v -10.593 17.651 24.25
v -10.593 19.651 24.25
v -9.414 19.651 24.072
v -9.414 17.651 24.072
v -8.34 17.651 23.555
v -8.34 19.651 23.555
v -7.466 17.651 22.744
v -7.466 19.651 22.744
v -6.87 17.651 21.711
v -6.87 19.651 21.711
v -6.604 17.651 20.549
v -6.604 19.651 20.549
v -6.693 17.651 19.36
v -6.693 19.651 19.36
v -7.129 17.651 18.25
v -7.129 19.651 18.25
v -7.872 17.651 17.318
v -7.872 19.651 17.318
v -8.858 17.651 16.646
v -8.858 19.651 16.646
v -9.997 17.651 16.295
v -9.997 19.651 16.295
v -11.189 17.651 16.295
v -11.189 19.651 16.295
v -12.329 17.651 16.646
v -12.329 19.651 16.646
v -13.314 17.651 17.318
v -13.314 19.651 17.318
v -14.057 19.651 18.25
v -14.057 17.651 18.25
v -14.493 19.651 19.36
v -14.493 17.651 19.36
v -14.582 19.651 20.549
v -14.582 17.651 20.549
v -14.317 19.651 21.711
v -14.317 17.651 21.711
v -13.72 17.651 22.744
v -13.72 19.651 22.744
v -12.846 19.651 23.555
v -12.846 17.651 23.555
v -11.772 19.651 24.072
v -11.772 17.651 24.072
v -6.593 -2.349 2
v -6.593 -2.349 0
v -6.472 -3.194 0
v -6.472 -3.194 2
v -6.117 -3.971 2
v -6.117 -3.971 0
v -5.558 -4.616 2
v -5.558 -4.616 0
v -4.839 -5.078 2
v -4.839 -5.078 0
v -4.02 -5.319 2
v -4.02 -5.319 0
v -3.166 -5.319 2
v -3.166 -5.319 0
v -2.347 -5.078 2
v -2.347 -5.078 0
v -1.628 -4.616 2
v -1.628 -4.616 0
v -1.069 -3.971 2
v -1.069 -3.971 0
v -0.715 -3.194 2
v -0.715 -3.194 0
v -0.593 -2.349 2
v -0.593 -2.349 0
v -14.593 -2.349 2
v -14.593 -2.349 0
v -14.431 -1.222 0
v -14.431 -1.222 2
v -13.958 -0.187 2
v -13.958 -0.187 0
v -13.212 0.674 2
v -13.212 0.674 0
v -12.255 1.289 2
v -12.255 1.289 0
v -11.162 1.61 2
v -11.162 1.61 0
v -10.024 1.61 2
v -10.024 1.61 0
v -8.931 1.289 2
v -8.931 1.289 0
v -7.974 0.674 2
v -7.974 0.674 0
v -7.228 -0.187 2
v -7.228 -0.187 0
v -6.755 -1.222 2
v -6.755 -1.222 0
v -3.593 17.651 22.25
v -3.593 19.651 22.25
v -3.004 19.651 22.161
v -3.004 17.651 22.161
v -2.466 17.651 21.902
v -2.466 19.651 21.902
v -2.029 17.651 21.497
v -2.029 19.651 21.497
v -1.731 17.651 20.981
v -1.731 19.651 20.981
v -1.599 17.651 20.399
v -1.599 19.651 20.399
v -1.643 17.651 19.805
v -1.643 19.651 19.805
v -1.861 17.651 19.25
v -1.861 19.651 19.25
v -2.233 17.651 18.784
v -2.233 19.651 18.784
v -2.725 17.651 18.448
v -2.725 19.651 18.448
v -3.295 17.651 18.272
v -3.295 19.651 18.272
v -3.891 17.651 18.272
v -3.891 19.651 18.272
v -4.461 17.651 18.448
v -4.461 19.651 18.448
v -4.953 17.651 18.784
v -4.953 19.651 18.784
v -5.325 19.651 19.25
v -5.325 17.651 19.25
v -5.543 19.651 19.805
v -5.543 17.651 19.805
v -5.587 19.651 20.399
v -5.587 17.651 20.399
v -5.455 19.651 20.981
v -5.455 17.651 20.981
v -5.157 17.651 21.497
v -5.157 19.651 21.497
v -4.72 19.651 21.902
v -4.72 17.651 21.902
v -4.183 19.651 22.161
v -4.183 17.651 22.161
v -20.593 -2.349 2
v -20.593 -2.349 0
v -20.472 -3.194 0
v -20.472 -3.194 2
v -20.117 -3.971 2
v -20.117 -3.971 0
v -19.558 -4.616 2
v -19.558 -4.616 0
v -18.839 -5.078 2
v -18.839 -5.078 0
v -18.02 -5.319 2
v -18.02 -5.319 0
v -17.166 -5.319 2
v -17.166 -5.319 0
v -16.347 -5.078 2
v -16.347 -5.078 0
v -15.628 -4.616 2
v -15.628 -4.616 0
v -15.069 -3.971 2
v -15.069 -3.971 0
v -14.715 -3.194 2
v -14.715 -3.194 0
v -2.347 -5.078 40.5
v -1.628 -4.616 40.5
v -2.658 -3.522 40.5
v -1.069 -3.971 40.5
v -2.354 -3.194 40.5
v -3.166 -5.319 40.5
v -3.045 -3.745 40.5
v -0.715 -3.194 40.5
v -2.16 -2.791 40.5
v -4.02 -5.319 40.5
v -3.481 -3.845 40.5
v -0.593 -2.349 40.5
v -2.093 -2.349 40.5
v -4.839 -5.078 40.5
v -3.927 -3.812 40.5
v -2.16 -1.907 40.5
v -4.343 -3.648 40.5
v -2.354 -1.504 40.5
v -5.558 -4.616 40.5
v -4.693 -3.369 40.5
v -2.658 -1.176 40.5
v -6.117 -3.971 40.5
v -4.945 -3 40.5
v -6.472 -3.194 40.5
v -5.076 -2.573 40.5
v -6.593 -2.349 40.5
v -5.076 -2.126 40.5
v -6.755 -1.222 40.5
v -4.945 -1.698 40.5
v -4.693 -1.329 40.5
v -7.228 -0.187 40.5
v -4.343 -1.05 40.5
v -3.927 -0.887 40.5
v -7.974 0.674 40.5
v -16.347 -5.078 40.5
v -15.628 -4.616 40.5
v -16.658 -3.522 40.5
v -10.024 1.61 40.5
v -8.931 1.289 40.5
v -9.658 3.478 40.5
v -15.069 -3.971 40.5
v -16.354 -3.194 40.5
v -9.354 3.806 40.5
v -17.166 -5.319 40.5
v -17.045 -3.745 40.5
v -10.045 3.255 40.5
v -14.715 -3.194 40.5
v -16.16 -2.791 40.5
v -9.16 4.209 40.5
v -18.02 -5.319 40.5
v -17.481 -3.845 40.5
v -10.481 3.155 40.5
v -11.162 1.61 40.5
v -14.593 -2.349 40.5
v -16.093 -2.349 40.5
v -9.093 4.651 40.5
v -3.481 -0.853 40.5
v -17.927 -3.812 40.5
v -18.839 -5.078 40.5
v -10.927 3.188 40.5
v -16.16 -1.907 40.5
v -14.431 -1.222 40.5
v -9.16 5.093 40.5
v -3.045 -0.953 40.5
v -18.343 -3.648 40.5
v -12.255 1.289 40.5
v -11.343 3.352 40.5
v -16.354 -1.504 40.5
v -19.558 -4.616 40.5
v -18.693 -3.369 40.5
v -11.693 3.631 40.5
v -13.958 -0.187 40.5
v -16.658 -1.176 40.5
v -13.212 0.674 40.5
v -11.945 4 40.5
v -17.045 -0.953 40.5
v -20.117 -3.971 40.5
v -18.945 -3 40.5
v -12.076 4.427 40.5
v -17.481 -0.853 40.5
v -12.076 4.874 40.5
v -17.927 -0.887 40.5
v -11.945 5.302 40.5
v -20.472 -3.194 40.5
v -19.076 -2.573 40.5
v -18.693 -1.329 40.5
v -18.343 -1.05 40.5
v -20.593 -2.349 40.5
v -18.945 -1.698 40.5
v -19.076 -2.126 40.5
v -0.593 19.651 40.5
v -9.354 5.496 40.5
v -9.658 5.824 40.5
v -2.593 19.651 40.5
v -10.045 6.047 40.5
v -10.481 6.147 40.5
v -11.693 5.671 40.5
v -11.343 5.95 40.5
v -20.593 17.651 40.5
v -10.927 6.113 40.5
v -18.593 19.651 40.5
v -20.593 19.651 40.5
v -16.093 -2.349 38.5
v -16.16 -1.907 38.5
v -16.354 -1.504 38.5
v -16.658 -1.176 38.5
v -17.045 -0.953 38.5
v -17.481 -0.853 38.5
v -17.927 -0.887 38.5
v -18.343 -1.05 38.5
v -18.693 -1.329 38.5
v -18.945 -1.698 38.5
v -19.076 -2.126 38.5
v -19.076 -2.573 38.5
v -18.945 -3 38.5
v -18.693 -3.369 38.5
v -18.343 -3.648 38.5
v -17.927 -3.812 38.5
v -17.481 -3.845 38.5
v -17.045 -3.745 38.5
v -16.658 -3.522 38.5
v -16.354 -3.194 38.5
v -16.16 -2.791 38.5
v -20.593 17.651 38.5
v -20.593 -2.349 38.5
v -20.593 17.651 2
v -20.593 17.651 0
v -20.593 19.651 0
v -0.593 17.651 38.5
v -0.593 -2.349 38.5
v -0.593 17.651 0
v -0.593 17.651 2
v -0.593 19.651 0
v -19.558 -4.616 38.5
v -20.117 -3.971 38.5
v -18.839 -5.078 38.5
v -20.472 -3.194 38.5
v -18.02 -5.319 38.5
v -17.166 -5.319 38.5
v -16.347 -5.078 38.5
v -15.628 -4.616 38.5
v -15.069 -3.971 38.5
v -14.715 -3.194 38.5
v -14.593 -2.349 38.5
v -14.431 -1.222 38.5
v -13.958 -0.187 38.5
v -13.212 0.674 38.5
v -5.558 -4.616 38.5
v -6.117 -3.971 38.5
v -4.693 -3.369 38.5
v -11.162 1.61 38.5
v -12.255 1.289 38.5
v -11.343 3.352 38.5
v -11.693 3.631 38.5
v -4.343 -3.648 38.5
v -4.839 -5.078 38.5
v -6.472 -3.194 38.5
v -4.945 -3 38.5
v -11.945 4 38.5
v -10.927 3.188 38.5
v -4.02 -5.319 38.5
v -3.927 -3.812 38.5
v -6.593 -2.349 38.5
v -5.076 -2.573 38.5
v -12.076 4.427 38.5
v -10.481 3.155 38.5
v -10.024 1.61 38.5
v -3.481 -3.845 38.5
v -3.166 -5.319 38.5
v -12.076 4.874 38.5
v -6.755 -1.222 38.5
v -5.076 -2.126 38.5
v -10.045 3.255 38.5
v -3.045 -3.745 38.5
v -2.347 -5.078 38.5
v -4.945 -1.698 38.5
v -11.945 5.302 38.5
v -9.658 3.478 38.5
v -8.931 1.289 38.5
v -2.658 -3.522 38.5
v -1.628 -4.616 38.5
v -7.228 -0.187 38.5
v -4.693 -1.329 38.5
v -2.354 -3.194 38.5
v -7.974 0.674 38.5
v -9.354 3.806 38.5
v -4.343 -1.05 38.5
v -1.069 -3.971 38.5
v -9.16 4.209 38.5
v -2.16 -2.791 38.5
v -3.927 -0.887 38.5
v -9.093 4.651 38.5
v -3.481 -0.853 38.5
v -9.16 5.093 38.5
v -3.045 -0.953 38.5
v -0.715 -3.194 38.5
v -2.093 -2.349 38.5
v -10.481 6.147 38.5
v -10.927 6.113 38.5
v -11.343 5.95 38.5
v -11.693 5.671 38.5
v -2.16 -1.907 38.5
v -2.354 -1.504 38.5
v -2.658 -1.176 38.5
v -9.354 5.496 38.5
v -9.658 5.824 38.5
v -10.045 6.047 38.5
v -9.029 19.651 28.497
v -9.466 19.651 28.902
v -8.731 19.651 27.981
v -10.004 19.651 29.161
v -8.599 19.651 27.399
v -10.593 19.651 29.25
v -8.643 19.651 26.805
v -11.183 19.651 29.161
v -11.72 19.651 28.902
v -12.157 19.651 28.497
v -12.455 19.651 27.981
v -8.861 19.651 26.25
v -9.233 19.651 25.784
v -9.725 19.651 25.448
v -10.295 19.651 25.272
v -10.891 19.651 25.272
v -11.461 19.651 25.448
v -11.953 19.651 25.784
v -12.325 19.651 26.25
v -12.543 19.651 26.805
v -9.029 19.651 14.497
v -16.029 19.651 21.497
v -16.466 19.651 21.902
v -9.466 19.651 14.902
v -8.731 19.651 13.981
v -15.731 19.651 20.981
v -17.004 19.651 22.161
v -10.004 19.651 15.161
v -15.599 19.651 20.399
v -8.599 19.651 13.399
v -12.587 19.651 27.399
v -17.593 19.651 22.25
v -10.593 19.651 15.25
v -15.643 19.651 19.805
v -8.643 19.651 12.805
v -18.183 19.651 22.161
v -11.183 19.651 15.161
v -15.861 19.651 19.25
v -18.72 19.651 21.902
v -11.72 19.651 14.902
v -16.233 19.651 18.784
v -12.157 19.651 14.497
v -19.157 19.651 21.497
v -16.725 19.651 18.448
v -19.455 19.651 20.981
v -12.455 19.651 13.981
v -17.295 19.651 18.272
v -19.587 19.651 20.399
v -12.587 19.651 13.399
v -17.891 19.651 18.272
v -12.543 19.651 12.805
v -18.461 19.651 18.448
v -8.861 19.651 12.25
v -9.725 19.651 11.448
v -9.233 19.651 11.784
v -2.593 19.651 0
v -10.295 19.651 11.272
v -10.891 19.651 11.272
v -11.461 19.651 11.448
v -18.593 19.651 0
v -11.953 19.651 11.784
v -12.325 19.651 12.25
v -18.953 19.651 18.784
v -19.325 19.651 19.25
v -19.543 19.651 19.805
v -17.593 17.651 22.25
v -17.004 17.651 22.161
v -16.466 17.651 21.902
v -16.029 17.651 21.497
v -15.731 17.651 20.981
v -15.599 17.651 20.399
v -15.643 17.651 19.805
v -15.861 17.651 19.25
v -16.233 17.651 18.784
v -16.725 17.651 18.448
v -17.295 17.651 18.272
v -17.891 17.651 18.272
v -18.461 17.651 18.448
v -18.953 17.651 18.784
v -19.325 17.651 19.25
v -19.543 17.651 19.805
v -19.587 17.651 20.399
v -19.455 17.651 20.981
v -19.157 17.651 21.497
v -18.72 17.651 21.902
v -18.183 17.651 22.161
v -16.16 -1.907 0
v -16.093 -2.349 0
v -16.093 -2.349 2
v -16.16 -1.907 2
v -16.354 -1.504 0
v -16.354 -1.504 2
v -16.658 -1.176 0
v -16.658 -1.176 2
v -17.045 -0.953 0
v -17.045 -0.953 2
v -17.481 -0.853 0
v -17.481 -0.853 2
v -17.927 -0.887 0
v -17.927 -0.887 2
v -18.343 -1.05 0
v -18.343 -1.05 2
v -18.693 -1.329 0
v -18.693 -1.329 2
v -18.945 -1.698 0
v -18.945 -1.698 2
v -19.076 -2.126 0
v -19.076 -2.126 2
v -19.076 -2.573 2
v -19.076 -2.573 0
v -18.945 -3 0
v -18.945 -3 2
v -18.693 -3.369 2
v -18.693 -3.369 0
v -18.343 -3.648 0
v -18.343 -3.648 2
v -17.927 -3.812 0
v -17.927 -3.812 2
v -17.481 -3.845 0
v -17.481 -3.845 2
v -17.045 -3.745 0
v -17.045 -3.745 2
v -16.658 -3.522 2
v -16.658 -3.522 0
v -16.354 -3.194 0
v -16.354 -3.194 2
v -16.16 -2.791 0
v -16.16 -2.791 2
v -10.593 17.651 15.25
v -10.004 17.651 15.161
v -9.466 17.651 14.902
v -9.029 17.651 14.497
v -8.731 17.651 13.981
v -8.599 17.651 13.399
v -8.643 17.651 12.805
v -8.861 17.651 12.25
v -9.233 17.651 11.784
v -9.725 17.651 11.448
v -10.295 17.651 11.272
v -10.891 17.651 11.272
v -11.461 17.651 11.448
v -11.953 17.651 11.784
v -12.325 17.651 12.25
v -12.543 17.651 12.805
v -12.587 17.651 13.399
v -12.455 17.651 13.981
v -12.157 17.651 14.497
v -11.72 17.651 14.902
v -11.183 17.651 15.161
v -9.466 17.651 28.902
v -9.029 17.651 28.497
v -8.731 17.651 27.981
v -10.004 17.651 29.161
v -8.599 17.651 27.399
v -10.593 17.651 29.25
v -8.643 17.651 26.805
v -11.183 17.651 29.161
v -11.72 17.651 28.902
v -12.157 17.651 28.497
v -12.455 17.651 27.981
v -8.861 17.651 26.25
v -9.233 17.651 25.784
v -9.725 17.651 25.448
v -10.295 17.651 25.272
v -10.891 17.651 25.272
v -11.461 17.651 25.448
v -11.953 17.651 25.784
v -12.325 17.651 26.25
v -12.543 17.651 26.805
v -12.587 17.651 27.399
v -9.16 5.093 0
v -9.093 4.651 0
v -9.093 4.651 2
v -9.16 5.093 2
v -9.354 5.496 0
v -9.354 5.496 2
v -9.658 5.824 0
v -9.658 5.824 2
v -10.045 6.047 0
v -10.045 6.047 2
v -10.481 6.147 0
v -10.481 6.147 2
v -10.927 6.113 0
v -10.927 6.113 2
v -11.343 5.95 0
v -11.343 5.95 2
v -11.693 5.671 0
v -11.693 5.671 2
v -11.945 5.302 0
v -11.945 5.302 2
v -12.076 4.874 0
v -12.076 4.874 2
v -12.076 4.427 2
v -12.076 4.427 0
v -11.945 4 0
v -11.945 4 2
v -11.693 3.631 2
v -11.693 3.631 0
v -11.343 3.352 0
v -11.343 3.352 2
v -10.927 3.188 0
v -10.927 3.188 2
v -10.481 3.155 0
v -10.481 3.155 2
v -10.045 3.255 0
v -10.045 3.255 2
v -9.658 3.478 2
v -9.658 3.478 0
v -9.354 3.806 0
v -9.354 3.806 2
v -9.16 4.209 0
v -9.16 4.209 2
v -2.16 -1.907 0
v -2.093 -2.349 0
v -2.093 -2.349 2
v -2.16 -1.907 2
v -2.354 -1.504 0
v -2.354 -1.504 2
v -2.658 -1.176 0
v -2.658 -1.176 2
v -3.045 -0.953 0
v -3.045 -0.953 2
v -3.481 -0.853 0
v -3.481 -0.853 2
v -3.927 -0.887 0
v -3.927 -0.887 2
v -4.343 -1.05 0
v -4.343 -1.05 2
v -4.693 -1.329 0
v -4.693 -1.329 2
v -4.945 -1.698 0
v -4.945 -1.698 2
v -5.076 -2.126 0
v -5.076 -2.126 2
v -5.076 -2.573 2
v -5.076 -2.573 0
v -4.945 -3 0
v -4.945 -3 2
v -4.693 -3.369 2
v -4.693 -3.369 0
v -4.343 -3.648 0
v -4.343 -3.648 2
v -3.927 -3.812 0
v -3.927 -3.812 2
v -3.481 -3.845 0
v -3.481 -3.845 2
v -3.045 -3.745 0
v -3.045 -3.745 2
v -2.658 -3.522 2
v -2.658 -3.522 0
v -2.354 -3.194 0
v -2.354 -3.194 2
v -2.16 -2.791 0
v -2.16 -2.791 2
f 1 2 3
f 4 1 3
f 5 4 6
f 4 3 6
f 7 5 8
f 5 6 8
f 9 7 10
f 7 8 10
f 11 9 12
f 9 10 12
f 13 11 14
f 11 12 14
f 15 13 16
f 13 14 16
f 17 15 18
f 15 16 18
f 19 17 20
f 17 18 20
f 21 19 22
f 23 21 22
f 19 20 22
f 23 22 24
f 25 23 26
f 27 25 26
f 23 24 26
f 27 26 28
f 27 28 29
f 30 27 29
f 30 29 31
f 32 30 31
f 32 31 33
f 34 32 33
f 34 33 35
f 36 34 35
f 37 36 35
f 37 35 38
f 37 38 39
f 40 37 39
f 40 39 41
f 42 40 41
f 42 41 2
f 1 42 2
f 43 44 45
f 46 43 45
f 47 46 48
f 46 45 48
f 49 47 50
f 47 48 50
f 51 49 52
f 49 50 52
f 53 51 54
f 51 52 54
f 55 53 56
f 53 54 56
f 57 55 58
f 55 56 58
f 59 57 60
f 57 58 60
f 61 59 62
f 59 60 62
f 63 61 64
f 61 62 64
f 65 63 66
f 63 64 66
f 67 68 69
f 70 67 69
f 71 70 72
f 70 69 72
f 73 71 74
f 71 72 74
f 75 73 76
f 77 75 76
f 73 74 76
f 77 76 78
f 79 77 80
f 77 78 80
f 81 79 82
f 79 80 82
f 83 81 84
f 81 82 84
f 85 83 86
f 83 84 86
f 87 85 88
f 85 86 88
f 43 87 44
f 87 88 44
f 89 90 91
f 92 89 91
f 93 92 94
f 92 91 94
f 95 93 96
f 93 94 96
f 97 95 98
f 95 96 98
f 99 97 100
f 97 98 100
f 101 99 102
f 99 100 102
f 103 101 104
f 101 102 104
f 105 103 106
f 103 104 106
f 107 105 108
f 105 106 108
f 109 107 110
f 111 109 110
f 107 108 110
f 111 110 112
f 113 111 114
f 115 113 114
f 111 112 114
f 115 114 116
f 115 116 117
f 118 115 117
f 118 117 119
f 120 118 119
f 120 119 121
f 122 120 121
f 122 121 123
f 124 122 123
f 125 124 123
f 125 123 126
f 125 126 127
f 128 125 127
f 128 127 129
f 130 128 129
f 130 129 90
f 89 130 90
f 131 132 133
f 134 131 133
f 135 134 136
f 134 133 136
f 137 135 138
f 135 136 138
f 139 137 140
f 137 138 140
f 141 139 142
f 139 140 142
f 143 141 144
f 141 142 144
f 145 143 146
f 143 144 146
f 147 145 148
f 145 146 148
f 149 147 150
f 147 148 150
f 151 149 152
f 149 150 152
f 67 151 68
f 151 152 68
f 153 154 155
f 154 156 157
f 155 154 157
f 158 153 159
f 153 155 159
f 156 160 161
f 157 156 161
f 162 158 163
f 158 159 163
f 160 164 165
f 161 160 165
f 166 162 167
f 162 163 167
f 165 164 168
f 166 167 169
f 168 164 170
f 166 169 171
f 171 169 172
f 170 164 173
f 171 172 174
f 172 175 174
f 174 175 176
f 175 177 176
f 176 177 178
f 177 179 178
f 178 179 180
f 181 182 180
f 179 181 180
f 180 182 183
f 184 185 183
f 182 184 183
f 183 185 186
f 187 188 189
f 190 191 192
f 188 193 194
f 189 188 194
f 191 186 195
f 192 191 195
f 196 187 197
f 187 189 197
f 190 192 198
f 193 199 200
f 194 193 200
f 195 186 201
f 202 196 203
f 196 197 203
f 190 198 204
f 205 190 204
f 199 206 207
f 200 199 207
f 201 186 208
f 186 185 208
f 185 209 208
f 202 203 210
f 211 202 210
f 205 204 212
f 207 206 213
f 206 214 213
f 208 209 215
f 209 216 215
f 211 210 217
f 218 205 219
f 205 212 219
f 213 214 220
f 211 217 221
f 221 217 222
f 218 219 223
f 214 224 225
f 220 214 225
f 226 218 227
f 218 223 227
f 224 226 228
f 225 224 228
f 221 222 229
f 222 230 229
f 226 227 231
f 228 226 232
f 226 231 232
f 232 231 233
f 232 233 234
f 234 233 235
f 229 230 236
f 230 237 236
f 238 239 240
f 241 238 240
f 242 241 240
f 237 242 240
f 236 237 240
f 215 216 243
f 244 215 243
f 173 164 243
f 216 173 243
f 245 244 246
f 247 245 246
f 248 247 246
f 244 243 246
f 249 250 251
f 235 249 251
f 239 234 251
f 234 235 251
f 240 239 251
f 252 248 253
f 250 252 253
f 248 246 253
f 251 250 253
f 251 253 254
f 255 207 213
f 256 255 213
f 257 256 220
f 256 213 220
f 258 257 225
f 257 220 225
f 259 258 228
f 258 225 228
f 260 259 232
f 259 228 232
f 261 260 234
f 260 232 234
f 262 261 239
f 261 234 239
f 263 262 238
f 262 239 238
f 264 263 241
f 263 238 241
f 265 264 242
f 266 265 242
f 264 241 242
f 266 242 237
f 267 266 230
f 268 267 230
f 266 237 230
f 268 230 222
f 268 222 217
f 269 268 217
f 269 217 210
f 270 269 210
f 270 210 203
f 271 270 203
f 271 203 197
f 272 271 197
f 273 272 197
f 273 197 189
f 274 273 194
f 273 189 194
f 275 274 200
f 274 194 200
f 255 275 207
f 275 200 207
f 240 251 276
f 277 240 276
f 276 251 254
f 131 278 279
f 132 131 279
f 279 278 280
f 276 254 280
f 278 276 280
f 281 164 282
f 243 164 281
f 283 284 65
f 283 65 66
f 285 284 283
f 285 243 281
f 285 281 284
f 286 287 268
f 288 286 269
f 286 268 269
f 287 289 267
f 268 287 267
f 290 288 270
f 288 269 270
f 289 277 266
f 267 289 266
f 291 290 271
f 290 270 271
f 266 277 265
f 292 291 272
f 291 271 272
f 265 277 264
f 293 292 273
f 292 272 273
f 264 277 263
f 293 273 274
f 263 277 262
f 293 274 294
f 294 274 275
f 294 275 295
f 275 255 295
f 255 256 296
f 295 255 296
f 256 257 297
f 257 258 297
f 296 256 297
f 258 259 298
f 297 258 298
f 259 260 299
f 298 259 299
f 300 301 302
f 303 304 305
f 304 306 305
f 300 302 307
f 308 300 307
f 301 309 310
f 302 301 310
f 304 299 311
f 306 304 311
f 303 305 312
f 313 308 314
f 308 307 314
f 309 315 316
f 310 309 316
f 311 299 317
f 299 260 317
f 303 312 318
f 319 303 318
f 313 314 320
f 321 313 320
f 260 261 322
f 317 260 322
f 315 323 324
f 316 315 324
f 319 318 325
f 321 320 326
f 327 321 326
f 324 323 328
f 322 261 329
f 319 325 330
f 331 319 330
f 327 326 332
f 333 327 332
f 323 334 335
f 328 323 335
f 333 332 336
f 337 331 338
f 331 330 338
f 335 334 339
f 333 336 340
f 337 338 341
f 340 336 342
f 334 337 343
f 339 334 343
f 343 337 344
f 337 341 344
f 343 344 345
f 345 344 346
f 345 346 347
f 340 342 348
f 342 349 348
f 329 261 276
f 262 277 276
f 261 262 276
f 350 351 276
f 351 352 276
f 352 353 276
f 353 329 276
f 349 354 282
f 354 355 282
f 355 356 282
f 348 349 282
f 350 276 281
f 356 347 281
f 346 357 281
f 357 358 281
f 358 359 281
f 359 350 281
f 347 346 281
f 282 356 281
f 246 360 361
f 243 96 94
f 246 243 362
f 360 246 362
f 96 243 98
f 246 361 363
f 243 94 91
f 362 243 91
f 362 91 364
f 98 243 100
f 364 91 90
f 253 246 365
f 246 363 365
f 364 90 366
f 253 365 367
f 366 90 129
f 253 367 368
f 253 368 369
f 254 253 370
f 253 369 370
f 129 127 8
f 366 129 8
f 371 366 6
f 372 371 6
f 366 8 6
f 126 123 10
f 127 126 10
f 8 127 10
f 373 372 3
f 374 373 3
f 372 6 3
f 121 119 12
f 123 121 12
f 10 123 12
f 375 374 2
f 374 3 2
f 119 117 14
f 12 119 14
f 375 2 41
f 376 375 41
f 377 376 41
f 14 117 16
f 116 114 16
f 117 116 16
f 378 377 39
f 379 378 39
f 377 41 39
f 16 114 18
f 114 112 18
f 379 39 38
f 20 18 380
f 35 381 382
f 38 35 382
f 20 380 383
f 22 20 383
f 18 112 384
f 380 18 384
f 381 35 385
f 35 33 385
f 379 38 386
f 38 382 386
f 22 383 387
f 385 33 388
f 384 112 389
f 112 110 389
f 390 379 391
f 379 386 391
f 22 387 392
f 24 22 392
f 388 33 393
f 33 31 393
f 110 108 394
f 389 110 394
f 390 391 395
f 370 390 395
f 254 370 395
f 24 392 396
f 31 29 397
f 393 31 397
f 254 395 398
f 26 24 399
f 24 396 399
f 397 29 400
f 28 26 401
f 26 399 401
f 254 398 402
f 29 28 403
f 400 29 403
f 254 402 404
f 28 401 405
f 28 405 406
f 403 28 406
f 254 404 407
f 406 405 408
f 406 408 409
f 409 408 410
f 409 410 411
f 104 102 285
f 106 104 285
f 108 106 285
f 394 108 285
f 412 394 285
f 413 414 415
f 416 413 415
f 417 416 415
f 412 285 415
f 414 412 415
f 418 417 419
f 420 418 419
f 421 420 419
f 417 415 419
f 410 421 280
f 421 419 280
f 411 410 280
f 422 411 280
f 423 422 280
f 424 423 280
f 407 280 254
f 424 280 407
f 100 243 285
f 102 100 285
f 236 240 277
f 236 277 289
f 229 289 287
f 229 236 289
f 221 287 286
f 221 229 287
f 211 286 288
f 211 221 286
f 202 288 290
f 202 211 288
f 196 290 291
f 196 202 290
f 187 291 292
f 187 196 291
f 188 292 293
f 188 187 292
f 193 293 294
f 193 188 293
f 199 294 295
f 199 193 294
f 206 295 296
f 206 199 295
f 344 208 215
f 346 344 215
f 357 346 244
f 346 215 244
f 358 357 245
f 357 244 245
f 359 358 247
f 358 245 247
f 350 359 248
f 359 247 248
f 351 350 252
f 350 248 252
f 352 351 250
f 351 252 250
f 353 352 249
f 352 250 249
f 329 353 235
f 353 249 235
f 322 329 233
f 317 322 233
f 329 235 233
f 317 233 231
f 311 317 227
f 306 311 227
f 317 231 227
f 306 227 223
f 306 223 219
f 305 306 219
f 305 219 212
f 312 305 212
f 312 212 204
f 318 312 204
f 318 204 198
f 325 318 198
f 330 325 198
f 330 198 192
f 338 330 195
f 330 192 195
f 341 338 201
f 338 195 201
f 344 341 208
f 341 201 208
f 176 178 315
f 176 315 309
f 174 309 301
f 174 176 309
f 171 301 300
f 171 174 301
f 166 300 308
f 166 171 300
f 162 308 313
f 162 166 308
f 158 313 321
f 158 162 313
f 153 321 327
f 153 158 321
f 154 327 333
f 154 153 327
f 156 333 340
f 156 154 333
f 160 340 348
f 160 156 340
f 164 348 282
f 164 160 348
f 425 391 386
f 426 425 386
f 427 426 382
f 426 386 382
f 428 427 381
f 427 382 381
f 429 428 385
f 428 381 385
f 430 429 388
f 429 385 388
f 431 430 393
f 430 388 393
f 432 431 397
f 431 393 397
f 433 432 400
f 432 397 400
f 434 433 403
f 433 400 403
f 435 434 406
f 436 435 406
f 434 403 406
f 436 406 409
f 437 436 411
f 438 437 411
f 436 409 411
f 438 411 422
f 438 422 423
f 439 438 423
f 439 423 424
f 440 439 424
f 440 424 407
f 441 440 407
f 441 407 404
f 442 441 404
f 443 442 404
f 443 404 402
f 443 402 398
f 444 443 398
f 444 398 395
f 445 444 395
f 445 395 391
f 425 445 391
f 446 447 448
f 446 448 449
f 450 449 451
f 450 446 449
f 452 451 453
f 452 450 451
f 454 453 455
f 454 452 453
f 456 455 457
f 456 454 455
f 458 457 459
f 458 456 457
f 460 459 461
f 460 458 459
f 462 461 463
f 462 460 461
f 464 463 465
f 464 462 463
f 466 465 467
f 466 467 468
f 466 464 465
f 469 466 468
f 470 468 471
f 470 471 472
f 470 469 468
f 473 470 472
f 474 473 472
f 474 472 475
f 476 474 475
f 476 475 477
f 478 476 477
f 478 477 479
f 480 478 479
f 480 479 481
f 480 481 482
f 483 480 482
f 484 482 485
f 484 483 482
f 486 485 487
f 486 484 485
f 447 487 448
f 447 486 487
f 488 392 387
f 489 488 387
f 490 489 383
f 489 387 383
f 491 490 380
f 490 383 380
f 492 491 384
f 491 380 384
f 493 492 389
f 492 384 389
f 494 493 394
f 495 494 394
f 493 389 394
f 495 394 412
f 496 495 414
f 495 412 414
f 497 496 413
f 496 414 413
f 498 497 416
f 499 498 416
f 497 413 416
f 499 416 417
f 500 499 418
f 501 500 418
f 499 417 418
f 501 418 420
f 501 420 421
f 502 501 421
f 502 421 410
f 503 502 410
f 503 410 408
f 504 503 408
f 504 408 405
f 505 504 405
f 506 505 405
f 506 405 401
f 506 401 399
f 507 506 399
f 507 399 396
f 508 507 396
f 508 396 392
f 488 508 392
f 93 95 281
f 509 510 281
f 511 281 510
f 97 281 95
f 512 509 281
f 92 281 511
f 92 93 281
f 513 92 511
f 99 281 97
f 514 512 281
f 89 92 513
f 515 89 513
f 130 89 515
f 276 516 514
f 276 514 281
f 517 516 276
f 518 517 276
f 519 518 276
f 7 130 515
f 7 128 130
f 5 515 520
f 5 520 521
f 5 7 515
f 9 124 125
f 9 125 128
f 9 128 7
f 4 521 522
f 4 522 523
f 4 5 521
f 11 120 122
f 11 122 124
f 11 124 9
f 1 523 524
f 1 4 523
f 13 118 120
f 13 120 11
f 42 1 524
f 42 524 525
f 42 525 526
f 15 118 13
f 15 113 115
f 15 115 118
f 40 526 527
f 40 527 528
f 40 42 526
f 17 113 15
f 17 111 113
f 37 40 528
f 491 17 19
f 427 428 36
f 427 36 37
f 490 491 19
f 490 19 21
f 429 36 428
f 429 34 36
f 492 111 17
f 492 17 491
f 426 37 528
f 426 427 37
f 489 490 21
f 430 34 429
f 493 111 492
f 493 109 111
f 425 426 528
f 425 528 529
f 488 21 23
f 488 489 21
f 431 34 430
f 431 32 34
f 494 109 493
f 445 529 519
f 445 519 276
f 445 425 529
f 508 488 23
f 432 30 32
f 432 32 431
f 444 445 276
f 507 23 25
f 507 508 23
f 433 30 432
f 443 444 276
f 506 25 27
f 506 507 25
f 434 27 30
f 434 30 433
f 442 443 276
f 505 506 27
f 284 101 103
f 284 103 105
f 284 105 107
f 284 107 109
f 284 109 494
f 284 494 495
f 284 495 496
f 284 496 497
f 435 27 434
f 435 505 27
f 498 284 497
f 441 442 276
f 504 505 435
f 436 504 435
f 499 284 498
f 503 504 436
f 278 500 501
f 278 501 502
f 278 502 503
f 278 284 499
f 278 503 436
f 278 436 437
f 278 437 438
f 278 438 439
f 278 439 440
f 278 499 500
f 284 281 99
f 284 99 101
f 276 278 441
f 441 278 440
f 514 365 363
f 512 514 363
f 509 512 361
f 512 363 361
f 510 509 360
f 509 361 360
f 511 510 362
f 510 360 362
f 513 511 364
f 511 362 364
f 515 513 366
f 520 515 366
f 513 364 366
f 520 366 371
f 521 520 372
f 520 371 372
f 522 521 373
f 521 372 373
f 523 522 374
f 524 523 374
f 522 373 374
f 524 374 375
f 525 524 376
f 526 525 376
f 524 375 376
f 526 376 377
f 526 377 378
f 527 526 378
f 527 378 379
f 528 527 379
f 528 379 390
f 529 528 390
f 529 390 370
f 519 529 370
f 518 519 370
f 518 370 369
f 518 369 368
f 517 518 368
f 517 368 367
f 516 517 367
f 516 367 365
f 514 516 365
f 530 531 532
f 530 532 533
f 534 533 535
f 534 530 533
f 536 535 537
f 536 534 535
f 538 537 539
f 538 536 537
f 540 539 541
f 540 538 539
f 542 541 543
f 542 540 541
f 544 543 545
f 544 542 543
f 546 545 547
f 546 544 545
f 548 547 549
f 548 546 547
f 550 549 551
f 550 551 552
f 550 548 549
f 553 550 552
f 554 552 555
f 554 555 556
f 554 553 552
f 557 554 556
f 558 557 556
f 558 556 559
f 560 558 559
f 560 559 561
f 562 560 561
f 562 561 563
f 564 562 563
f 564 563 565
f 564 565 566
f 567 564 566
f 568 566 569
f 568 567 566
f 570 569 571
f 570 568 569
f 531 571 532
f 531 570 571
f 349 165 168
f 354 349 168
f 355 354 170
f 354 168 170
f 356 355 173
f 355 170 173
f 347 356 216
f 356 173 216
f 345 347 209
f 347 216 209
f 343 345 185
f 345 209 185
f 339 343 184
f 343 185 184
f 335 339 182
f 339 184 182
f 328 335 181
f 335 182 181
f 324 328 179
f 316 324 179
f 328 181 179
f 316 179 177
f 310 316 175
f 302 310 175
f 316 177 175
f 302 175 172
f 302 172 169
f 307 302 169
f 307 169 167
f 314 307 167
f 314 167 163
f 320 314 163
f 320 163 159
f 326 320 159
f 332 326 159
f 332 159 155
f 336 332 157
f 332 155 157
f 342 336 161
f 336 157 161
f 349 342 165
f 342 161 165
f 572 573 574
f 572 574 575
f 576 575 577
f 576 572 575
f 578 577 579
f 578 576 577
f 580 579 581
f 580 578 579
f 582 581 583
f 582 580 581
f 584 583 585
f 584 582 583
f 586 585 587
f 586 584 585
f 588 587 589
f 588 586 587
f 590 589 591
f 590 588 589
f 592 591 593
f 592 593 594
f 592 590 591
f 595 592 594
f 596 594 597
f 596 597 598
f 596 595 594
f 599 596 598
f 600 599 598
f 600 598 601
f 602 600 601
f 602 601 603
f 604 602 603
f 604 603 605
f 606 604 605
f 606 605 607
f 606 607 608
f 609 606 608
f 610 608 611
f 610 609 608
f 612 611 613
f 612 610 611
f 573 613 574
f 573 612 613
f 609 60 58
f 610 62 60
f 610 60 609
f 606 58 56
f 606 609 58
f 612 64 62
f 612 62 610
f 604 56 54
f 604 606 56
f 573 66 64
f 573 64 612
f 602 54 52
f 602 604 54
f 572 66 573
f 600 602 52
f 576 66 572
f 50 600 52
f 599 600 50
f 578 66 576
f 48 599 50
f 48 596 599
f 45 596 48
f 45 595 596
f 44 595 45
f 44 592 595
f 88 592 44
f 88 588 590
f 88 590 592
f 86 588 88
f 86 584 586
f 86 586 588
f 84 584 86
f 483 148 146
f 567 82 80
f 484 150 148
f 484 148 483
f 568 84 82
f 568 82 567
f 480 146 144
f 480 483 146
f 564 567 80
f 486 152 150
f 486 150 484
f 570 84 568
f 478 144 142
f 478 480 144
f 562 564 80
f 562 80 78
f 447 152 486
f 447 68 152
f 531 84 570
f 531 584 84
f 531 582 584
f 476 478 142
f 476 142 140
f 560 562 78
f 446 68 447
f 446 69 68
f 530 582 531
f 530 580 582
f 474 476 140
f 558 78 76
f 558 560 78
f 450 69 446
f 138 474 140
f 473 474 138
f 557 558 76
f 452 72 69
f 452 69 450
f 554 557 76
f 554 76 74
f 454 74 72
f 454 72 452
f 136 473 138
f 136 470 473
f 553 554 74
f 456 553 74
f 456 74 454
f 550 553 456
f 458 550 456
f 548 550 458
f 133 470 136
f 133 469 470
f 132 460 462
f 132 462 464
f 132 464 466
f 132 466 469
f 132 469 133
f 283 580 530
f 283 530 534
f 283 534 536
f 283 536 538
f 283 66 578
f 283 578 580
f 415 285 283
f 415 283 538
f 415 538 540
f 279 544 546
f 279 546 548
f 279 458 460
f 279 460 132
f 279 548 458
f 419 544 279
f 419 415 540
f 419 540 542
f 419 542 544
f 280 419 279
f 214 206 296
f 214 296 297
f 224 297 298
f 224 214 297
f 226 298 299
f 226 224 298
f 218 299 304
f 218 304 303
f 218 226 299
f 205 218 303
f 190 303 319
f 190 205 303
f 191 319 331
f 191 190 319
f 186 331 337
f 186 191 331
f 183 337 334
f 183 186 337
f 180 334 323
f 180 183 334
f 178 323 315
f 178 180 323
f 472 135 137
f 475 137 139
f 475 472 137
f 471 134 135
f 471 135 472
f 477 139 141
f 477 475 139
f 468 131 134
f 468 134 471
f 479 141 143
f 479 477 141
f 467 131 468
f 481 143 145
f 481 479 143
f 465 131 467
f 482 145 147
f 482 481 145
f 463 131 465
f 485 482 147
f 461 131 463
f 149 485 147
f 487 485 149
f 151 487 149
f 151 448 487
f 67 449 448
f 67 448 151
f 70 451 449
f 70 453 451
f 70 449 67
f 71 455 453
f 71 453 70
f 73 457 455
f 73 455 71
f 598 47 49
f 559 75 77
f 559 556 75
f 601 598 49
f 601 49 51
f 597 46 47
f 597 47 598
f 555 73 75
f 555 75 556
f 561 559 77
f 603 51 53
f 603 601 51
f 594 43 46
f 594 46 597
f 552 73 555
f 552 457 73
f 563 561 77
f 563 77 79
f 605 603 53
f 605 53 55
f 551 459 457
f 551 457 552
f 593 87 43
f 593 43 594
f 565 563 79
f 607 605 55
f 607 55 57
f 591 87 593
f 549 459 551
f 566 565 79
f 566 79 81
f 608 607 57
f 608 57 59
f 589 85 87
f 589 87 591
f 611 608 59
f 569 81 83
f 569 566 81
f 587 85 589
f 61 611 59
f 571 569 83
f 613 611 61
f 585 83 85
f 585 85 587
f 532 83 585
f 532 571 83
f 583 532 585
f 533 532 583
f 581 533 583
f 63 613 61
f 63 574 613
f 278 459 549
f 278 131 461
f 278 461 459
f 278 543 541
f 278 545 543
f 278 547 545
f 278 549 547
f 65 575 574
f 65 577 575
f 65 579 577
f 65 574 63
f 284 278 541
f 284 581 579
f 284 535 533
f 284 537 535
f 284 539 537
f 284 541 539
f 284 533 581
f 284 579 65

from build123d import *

# Parameters (mm, degrees)
CROQUIS1_R              = 1.5
SALIENTE_EXTRUIR3_DEPTH = 2
CROQUIS7_W              = 20
CROQUIS7_H              = 20.25
SALIENTE_EXTRUIR4_DEPTH = 2
CROQUIS15_R             = 2
CROQUIS15_R_2           = 4
CORTAR_EXTRUIR1_DEPTH   = 10


with BuildPart() as part:
    # Croquis1 → Saliente-Extruir3 (new body)
    with BuildSketch(Plane.XY.offset(325.976420163)):
        with BuildLine():
            Line((-20.593054102, 17.650860191), (-20.593054102, -2.349139809))
            ThreePointArc((-20.593054102, -2.349139809), (-17.593054102, -5.349139809), (-14.593054102, -2.349139809))
            ThreePointArc((-14.593054102, -2.349139809), (-10.593054102, 1.650860191), (-6.593054102, -2.349139809))
            ThreePointArc((-6.593054102, -2.349139809), (-3.593054102, -5.349139809), (-0.593054102, -2.349139809))
            Line((-0.593054102, -2.349139809), (-0.593054102, 17.650860191))
            ThreePointArc((-0.593054102, 17.650860191), (-1.17884054, 19.065073753), (-2.593054102, 19.650860191))
            Line((-2.593054102, 19.650860191), (-18.593054102, 19.650860191))
            ThreePointArc((-18.593054102, 19.650860191), (-20.007267664, 19.065073753), (-20.593054102, 17.650860191))
        make_face()
        with Locations((-17.593054102, -2.349139809)):
            Circle(CROQUIS1_R, mode=Mode.SUBTRACT)
        with Locations((-10.593054102, 4.650860191)):
            Circle(CROQUIS1_R, mode=Mode.SUBTRACT)
        with Locations((-3.593054102, -2.349139809)):
            Circle(CROQUIS1_R, mode=Mode.SUBTRACT)
    extrude(amount=SALIENTE_EXTRUIR3_DEPTH)


with BuildPart() as part_1:
    # Sólido-Mover/Copiar1: read off the stored shape, not the designer's step
    # Sólido-Mover/Copiar1: moved
    add(part.part.moved(Location((0, 0, -325.9764202))))

    # Croquis7 → Saliente-Extruir4 (add)
    with BuildSketch(Plane(origin=(0, 19.650860191, 0), x_dir=(-1, 0, 0), z_dir=(0, 1, 0))):
        with Locations((10.593054102, 10.125)):
            Rectangle(CROQUIS7_W, CROQUIS7_H)
    extrude(amount=-SALIENTE_EXTRUIR4_DEPTH)

    # Simetría5: part across plane


with BuildPart() as part_2:
    add(part_1.part)
    add(part_1.part.mirror(Plane(origin=(-0.593054102, 17.650860191, 20.25), x_dir=(1, 0, 0), z_dir=(0, 0, 1))))

    # Croquis15 → Cortar-Extruir1 (cut)
    with BuildSketch(Plane(origin=(0, 19.650860191, 0), x_dir=(-1, 0, 0), z_dir=(0, 1, 0))):
        with Locations(Location((10.593054102, 27.25, 0), (0, 0, 90))):
            Circle(CROQUIS15_R)
        with Locations(Location((17.593054102, 20.25, 0), (0, 0, 90))):
            Circle(CROQUIS15_R)
        with Locations(Location((10.593054102, 13.25, 0), (0, 0, 90))):
            Circle(CROQUIS15_R)
        with Locations(Location((3.593054102, 20.25, 0), (0, 0, 90))):
            Circle(CROQUIS15_R)
        with Locations(Location((10.593054102, 20.25, 0), (0, 0, 90))):
            Circle(CROQUIS15_R_2)
    extrude(amount=-CORTAR_EXTRUIR1_DEPTH, mode=Mode.SUBTRACT)


solid = part_2.part
